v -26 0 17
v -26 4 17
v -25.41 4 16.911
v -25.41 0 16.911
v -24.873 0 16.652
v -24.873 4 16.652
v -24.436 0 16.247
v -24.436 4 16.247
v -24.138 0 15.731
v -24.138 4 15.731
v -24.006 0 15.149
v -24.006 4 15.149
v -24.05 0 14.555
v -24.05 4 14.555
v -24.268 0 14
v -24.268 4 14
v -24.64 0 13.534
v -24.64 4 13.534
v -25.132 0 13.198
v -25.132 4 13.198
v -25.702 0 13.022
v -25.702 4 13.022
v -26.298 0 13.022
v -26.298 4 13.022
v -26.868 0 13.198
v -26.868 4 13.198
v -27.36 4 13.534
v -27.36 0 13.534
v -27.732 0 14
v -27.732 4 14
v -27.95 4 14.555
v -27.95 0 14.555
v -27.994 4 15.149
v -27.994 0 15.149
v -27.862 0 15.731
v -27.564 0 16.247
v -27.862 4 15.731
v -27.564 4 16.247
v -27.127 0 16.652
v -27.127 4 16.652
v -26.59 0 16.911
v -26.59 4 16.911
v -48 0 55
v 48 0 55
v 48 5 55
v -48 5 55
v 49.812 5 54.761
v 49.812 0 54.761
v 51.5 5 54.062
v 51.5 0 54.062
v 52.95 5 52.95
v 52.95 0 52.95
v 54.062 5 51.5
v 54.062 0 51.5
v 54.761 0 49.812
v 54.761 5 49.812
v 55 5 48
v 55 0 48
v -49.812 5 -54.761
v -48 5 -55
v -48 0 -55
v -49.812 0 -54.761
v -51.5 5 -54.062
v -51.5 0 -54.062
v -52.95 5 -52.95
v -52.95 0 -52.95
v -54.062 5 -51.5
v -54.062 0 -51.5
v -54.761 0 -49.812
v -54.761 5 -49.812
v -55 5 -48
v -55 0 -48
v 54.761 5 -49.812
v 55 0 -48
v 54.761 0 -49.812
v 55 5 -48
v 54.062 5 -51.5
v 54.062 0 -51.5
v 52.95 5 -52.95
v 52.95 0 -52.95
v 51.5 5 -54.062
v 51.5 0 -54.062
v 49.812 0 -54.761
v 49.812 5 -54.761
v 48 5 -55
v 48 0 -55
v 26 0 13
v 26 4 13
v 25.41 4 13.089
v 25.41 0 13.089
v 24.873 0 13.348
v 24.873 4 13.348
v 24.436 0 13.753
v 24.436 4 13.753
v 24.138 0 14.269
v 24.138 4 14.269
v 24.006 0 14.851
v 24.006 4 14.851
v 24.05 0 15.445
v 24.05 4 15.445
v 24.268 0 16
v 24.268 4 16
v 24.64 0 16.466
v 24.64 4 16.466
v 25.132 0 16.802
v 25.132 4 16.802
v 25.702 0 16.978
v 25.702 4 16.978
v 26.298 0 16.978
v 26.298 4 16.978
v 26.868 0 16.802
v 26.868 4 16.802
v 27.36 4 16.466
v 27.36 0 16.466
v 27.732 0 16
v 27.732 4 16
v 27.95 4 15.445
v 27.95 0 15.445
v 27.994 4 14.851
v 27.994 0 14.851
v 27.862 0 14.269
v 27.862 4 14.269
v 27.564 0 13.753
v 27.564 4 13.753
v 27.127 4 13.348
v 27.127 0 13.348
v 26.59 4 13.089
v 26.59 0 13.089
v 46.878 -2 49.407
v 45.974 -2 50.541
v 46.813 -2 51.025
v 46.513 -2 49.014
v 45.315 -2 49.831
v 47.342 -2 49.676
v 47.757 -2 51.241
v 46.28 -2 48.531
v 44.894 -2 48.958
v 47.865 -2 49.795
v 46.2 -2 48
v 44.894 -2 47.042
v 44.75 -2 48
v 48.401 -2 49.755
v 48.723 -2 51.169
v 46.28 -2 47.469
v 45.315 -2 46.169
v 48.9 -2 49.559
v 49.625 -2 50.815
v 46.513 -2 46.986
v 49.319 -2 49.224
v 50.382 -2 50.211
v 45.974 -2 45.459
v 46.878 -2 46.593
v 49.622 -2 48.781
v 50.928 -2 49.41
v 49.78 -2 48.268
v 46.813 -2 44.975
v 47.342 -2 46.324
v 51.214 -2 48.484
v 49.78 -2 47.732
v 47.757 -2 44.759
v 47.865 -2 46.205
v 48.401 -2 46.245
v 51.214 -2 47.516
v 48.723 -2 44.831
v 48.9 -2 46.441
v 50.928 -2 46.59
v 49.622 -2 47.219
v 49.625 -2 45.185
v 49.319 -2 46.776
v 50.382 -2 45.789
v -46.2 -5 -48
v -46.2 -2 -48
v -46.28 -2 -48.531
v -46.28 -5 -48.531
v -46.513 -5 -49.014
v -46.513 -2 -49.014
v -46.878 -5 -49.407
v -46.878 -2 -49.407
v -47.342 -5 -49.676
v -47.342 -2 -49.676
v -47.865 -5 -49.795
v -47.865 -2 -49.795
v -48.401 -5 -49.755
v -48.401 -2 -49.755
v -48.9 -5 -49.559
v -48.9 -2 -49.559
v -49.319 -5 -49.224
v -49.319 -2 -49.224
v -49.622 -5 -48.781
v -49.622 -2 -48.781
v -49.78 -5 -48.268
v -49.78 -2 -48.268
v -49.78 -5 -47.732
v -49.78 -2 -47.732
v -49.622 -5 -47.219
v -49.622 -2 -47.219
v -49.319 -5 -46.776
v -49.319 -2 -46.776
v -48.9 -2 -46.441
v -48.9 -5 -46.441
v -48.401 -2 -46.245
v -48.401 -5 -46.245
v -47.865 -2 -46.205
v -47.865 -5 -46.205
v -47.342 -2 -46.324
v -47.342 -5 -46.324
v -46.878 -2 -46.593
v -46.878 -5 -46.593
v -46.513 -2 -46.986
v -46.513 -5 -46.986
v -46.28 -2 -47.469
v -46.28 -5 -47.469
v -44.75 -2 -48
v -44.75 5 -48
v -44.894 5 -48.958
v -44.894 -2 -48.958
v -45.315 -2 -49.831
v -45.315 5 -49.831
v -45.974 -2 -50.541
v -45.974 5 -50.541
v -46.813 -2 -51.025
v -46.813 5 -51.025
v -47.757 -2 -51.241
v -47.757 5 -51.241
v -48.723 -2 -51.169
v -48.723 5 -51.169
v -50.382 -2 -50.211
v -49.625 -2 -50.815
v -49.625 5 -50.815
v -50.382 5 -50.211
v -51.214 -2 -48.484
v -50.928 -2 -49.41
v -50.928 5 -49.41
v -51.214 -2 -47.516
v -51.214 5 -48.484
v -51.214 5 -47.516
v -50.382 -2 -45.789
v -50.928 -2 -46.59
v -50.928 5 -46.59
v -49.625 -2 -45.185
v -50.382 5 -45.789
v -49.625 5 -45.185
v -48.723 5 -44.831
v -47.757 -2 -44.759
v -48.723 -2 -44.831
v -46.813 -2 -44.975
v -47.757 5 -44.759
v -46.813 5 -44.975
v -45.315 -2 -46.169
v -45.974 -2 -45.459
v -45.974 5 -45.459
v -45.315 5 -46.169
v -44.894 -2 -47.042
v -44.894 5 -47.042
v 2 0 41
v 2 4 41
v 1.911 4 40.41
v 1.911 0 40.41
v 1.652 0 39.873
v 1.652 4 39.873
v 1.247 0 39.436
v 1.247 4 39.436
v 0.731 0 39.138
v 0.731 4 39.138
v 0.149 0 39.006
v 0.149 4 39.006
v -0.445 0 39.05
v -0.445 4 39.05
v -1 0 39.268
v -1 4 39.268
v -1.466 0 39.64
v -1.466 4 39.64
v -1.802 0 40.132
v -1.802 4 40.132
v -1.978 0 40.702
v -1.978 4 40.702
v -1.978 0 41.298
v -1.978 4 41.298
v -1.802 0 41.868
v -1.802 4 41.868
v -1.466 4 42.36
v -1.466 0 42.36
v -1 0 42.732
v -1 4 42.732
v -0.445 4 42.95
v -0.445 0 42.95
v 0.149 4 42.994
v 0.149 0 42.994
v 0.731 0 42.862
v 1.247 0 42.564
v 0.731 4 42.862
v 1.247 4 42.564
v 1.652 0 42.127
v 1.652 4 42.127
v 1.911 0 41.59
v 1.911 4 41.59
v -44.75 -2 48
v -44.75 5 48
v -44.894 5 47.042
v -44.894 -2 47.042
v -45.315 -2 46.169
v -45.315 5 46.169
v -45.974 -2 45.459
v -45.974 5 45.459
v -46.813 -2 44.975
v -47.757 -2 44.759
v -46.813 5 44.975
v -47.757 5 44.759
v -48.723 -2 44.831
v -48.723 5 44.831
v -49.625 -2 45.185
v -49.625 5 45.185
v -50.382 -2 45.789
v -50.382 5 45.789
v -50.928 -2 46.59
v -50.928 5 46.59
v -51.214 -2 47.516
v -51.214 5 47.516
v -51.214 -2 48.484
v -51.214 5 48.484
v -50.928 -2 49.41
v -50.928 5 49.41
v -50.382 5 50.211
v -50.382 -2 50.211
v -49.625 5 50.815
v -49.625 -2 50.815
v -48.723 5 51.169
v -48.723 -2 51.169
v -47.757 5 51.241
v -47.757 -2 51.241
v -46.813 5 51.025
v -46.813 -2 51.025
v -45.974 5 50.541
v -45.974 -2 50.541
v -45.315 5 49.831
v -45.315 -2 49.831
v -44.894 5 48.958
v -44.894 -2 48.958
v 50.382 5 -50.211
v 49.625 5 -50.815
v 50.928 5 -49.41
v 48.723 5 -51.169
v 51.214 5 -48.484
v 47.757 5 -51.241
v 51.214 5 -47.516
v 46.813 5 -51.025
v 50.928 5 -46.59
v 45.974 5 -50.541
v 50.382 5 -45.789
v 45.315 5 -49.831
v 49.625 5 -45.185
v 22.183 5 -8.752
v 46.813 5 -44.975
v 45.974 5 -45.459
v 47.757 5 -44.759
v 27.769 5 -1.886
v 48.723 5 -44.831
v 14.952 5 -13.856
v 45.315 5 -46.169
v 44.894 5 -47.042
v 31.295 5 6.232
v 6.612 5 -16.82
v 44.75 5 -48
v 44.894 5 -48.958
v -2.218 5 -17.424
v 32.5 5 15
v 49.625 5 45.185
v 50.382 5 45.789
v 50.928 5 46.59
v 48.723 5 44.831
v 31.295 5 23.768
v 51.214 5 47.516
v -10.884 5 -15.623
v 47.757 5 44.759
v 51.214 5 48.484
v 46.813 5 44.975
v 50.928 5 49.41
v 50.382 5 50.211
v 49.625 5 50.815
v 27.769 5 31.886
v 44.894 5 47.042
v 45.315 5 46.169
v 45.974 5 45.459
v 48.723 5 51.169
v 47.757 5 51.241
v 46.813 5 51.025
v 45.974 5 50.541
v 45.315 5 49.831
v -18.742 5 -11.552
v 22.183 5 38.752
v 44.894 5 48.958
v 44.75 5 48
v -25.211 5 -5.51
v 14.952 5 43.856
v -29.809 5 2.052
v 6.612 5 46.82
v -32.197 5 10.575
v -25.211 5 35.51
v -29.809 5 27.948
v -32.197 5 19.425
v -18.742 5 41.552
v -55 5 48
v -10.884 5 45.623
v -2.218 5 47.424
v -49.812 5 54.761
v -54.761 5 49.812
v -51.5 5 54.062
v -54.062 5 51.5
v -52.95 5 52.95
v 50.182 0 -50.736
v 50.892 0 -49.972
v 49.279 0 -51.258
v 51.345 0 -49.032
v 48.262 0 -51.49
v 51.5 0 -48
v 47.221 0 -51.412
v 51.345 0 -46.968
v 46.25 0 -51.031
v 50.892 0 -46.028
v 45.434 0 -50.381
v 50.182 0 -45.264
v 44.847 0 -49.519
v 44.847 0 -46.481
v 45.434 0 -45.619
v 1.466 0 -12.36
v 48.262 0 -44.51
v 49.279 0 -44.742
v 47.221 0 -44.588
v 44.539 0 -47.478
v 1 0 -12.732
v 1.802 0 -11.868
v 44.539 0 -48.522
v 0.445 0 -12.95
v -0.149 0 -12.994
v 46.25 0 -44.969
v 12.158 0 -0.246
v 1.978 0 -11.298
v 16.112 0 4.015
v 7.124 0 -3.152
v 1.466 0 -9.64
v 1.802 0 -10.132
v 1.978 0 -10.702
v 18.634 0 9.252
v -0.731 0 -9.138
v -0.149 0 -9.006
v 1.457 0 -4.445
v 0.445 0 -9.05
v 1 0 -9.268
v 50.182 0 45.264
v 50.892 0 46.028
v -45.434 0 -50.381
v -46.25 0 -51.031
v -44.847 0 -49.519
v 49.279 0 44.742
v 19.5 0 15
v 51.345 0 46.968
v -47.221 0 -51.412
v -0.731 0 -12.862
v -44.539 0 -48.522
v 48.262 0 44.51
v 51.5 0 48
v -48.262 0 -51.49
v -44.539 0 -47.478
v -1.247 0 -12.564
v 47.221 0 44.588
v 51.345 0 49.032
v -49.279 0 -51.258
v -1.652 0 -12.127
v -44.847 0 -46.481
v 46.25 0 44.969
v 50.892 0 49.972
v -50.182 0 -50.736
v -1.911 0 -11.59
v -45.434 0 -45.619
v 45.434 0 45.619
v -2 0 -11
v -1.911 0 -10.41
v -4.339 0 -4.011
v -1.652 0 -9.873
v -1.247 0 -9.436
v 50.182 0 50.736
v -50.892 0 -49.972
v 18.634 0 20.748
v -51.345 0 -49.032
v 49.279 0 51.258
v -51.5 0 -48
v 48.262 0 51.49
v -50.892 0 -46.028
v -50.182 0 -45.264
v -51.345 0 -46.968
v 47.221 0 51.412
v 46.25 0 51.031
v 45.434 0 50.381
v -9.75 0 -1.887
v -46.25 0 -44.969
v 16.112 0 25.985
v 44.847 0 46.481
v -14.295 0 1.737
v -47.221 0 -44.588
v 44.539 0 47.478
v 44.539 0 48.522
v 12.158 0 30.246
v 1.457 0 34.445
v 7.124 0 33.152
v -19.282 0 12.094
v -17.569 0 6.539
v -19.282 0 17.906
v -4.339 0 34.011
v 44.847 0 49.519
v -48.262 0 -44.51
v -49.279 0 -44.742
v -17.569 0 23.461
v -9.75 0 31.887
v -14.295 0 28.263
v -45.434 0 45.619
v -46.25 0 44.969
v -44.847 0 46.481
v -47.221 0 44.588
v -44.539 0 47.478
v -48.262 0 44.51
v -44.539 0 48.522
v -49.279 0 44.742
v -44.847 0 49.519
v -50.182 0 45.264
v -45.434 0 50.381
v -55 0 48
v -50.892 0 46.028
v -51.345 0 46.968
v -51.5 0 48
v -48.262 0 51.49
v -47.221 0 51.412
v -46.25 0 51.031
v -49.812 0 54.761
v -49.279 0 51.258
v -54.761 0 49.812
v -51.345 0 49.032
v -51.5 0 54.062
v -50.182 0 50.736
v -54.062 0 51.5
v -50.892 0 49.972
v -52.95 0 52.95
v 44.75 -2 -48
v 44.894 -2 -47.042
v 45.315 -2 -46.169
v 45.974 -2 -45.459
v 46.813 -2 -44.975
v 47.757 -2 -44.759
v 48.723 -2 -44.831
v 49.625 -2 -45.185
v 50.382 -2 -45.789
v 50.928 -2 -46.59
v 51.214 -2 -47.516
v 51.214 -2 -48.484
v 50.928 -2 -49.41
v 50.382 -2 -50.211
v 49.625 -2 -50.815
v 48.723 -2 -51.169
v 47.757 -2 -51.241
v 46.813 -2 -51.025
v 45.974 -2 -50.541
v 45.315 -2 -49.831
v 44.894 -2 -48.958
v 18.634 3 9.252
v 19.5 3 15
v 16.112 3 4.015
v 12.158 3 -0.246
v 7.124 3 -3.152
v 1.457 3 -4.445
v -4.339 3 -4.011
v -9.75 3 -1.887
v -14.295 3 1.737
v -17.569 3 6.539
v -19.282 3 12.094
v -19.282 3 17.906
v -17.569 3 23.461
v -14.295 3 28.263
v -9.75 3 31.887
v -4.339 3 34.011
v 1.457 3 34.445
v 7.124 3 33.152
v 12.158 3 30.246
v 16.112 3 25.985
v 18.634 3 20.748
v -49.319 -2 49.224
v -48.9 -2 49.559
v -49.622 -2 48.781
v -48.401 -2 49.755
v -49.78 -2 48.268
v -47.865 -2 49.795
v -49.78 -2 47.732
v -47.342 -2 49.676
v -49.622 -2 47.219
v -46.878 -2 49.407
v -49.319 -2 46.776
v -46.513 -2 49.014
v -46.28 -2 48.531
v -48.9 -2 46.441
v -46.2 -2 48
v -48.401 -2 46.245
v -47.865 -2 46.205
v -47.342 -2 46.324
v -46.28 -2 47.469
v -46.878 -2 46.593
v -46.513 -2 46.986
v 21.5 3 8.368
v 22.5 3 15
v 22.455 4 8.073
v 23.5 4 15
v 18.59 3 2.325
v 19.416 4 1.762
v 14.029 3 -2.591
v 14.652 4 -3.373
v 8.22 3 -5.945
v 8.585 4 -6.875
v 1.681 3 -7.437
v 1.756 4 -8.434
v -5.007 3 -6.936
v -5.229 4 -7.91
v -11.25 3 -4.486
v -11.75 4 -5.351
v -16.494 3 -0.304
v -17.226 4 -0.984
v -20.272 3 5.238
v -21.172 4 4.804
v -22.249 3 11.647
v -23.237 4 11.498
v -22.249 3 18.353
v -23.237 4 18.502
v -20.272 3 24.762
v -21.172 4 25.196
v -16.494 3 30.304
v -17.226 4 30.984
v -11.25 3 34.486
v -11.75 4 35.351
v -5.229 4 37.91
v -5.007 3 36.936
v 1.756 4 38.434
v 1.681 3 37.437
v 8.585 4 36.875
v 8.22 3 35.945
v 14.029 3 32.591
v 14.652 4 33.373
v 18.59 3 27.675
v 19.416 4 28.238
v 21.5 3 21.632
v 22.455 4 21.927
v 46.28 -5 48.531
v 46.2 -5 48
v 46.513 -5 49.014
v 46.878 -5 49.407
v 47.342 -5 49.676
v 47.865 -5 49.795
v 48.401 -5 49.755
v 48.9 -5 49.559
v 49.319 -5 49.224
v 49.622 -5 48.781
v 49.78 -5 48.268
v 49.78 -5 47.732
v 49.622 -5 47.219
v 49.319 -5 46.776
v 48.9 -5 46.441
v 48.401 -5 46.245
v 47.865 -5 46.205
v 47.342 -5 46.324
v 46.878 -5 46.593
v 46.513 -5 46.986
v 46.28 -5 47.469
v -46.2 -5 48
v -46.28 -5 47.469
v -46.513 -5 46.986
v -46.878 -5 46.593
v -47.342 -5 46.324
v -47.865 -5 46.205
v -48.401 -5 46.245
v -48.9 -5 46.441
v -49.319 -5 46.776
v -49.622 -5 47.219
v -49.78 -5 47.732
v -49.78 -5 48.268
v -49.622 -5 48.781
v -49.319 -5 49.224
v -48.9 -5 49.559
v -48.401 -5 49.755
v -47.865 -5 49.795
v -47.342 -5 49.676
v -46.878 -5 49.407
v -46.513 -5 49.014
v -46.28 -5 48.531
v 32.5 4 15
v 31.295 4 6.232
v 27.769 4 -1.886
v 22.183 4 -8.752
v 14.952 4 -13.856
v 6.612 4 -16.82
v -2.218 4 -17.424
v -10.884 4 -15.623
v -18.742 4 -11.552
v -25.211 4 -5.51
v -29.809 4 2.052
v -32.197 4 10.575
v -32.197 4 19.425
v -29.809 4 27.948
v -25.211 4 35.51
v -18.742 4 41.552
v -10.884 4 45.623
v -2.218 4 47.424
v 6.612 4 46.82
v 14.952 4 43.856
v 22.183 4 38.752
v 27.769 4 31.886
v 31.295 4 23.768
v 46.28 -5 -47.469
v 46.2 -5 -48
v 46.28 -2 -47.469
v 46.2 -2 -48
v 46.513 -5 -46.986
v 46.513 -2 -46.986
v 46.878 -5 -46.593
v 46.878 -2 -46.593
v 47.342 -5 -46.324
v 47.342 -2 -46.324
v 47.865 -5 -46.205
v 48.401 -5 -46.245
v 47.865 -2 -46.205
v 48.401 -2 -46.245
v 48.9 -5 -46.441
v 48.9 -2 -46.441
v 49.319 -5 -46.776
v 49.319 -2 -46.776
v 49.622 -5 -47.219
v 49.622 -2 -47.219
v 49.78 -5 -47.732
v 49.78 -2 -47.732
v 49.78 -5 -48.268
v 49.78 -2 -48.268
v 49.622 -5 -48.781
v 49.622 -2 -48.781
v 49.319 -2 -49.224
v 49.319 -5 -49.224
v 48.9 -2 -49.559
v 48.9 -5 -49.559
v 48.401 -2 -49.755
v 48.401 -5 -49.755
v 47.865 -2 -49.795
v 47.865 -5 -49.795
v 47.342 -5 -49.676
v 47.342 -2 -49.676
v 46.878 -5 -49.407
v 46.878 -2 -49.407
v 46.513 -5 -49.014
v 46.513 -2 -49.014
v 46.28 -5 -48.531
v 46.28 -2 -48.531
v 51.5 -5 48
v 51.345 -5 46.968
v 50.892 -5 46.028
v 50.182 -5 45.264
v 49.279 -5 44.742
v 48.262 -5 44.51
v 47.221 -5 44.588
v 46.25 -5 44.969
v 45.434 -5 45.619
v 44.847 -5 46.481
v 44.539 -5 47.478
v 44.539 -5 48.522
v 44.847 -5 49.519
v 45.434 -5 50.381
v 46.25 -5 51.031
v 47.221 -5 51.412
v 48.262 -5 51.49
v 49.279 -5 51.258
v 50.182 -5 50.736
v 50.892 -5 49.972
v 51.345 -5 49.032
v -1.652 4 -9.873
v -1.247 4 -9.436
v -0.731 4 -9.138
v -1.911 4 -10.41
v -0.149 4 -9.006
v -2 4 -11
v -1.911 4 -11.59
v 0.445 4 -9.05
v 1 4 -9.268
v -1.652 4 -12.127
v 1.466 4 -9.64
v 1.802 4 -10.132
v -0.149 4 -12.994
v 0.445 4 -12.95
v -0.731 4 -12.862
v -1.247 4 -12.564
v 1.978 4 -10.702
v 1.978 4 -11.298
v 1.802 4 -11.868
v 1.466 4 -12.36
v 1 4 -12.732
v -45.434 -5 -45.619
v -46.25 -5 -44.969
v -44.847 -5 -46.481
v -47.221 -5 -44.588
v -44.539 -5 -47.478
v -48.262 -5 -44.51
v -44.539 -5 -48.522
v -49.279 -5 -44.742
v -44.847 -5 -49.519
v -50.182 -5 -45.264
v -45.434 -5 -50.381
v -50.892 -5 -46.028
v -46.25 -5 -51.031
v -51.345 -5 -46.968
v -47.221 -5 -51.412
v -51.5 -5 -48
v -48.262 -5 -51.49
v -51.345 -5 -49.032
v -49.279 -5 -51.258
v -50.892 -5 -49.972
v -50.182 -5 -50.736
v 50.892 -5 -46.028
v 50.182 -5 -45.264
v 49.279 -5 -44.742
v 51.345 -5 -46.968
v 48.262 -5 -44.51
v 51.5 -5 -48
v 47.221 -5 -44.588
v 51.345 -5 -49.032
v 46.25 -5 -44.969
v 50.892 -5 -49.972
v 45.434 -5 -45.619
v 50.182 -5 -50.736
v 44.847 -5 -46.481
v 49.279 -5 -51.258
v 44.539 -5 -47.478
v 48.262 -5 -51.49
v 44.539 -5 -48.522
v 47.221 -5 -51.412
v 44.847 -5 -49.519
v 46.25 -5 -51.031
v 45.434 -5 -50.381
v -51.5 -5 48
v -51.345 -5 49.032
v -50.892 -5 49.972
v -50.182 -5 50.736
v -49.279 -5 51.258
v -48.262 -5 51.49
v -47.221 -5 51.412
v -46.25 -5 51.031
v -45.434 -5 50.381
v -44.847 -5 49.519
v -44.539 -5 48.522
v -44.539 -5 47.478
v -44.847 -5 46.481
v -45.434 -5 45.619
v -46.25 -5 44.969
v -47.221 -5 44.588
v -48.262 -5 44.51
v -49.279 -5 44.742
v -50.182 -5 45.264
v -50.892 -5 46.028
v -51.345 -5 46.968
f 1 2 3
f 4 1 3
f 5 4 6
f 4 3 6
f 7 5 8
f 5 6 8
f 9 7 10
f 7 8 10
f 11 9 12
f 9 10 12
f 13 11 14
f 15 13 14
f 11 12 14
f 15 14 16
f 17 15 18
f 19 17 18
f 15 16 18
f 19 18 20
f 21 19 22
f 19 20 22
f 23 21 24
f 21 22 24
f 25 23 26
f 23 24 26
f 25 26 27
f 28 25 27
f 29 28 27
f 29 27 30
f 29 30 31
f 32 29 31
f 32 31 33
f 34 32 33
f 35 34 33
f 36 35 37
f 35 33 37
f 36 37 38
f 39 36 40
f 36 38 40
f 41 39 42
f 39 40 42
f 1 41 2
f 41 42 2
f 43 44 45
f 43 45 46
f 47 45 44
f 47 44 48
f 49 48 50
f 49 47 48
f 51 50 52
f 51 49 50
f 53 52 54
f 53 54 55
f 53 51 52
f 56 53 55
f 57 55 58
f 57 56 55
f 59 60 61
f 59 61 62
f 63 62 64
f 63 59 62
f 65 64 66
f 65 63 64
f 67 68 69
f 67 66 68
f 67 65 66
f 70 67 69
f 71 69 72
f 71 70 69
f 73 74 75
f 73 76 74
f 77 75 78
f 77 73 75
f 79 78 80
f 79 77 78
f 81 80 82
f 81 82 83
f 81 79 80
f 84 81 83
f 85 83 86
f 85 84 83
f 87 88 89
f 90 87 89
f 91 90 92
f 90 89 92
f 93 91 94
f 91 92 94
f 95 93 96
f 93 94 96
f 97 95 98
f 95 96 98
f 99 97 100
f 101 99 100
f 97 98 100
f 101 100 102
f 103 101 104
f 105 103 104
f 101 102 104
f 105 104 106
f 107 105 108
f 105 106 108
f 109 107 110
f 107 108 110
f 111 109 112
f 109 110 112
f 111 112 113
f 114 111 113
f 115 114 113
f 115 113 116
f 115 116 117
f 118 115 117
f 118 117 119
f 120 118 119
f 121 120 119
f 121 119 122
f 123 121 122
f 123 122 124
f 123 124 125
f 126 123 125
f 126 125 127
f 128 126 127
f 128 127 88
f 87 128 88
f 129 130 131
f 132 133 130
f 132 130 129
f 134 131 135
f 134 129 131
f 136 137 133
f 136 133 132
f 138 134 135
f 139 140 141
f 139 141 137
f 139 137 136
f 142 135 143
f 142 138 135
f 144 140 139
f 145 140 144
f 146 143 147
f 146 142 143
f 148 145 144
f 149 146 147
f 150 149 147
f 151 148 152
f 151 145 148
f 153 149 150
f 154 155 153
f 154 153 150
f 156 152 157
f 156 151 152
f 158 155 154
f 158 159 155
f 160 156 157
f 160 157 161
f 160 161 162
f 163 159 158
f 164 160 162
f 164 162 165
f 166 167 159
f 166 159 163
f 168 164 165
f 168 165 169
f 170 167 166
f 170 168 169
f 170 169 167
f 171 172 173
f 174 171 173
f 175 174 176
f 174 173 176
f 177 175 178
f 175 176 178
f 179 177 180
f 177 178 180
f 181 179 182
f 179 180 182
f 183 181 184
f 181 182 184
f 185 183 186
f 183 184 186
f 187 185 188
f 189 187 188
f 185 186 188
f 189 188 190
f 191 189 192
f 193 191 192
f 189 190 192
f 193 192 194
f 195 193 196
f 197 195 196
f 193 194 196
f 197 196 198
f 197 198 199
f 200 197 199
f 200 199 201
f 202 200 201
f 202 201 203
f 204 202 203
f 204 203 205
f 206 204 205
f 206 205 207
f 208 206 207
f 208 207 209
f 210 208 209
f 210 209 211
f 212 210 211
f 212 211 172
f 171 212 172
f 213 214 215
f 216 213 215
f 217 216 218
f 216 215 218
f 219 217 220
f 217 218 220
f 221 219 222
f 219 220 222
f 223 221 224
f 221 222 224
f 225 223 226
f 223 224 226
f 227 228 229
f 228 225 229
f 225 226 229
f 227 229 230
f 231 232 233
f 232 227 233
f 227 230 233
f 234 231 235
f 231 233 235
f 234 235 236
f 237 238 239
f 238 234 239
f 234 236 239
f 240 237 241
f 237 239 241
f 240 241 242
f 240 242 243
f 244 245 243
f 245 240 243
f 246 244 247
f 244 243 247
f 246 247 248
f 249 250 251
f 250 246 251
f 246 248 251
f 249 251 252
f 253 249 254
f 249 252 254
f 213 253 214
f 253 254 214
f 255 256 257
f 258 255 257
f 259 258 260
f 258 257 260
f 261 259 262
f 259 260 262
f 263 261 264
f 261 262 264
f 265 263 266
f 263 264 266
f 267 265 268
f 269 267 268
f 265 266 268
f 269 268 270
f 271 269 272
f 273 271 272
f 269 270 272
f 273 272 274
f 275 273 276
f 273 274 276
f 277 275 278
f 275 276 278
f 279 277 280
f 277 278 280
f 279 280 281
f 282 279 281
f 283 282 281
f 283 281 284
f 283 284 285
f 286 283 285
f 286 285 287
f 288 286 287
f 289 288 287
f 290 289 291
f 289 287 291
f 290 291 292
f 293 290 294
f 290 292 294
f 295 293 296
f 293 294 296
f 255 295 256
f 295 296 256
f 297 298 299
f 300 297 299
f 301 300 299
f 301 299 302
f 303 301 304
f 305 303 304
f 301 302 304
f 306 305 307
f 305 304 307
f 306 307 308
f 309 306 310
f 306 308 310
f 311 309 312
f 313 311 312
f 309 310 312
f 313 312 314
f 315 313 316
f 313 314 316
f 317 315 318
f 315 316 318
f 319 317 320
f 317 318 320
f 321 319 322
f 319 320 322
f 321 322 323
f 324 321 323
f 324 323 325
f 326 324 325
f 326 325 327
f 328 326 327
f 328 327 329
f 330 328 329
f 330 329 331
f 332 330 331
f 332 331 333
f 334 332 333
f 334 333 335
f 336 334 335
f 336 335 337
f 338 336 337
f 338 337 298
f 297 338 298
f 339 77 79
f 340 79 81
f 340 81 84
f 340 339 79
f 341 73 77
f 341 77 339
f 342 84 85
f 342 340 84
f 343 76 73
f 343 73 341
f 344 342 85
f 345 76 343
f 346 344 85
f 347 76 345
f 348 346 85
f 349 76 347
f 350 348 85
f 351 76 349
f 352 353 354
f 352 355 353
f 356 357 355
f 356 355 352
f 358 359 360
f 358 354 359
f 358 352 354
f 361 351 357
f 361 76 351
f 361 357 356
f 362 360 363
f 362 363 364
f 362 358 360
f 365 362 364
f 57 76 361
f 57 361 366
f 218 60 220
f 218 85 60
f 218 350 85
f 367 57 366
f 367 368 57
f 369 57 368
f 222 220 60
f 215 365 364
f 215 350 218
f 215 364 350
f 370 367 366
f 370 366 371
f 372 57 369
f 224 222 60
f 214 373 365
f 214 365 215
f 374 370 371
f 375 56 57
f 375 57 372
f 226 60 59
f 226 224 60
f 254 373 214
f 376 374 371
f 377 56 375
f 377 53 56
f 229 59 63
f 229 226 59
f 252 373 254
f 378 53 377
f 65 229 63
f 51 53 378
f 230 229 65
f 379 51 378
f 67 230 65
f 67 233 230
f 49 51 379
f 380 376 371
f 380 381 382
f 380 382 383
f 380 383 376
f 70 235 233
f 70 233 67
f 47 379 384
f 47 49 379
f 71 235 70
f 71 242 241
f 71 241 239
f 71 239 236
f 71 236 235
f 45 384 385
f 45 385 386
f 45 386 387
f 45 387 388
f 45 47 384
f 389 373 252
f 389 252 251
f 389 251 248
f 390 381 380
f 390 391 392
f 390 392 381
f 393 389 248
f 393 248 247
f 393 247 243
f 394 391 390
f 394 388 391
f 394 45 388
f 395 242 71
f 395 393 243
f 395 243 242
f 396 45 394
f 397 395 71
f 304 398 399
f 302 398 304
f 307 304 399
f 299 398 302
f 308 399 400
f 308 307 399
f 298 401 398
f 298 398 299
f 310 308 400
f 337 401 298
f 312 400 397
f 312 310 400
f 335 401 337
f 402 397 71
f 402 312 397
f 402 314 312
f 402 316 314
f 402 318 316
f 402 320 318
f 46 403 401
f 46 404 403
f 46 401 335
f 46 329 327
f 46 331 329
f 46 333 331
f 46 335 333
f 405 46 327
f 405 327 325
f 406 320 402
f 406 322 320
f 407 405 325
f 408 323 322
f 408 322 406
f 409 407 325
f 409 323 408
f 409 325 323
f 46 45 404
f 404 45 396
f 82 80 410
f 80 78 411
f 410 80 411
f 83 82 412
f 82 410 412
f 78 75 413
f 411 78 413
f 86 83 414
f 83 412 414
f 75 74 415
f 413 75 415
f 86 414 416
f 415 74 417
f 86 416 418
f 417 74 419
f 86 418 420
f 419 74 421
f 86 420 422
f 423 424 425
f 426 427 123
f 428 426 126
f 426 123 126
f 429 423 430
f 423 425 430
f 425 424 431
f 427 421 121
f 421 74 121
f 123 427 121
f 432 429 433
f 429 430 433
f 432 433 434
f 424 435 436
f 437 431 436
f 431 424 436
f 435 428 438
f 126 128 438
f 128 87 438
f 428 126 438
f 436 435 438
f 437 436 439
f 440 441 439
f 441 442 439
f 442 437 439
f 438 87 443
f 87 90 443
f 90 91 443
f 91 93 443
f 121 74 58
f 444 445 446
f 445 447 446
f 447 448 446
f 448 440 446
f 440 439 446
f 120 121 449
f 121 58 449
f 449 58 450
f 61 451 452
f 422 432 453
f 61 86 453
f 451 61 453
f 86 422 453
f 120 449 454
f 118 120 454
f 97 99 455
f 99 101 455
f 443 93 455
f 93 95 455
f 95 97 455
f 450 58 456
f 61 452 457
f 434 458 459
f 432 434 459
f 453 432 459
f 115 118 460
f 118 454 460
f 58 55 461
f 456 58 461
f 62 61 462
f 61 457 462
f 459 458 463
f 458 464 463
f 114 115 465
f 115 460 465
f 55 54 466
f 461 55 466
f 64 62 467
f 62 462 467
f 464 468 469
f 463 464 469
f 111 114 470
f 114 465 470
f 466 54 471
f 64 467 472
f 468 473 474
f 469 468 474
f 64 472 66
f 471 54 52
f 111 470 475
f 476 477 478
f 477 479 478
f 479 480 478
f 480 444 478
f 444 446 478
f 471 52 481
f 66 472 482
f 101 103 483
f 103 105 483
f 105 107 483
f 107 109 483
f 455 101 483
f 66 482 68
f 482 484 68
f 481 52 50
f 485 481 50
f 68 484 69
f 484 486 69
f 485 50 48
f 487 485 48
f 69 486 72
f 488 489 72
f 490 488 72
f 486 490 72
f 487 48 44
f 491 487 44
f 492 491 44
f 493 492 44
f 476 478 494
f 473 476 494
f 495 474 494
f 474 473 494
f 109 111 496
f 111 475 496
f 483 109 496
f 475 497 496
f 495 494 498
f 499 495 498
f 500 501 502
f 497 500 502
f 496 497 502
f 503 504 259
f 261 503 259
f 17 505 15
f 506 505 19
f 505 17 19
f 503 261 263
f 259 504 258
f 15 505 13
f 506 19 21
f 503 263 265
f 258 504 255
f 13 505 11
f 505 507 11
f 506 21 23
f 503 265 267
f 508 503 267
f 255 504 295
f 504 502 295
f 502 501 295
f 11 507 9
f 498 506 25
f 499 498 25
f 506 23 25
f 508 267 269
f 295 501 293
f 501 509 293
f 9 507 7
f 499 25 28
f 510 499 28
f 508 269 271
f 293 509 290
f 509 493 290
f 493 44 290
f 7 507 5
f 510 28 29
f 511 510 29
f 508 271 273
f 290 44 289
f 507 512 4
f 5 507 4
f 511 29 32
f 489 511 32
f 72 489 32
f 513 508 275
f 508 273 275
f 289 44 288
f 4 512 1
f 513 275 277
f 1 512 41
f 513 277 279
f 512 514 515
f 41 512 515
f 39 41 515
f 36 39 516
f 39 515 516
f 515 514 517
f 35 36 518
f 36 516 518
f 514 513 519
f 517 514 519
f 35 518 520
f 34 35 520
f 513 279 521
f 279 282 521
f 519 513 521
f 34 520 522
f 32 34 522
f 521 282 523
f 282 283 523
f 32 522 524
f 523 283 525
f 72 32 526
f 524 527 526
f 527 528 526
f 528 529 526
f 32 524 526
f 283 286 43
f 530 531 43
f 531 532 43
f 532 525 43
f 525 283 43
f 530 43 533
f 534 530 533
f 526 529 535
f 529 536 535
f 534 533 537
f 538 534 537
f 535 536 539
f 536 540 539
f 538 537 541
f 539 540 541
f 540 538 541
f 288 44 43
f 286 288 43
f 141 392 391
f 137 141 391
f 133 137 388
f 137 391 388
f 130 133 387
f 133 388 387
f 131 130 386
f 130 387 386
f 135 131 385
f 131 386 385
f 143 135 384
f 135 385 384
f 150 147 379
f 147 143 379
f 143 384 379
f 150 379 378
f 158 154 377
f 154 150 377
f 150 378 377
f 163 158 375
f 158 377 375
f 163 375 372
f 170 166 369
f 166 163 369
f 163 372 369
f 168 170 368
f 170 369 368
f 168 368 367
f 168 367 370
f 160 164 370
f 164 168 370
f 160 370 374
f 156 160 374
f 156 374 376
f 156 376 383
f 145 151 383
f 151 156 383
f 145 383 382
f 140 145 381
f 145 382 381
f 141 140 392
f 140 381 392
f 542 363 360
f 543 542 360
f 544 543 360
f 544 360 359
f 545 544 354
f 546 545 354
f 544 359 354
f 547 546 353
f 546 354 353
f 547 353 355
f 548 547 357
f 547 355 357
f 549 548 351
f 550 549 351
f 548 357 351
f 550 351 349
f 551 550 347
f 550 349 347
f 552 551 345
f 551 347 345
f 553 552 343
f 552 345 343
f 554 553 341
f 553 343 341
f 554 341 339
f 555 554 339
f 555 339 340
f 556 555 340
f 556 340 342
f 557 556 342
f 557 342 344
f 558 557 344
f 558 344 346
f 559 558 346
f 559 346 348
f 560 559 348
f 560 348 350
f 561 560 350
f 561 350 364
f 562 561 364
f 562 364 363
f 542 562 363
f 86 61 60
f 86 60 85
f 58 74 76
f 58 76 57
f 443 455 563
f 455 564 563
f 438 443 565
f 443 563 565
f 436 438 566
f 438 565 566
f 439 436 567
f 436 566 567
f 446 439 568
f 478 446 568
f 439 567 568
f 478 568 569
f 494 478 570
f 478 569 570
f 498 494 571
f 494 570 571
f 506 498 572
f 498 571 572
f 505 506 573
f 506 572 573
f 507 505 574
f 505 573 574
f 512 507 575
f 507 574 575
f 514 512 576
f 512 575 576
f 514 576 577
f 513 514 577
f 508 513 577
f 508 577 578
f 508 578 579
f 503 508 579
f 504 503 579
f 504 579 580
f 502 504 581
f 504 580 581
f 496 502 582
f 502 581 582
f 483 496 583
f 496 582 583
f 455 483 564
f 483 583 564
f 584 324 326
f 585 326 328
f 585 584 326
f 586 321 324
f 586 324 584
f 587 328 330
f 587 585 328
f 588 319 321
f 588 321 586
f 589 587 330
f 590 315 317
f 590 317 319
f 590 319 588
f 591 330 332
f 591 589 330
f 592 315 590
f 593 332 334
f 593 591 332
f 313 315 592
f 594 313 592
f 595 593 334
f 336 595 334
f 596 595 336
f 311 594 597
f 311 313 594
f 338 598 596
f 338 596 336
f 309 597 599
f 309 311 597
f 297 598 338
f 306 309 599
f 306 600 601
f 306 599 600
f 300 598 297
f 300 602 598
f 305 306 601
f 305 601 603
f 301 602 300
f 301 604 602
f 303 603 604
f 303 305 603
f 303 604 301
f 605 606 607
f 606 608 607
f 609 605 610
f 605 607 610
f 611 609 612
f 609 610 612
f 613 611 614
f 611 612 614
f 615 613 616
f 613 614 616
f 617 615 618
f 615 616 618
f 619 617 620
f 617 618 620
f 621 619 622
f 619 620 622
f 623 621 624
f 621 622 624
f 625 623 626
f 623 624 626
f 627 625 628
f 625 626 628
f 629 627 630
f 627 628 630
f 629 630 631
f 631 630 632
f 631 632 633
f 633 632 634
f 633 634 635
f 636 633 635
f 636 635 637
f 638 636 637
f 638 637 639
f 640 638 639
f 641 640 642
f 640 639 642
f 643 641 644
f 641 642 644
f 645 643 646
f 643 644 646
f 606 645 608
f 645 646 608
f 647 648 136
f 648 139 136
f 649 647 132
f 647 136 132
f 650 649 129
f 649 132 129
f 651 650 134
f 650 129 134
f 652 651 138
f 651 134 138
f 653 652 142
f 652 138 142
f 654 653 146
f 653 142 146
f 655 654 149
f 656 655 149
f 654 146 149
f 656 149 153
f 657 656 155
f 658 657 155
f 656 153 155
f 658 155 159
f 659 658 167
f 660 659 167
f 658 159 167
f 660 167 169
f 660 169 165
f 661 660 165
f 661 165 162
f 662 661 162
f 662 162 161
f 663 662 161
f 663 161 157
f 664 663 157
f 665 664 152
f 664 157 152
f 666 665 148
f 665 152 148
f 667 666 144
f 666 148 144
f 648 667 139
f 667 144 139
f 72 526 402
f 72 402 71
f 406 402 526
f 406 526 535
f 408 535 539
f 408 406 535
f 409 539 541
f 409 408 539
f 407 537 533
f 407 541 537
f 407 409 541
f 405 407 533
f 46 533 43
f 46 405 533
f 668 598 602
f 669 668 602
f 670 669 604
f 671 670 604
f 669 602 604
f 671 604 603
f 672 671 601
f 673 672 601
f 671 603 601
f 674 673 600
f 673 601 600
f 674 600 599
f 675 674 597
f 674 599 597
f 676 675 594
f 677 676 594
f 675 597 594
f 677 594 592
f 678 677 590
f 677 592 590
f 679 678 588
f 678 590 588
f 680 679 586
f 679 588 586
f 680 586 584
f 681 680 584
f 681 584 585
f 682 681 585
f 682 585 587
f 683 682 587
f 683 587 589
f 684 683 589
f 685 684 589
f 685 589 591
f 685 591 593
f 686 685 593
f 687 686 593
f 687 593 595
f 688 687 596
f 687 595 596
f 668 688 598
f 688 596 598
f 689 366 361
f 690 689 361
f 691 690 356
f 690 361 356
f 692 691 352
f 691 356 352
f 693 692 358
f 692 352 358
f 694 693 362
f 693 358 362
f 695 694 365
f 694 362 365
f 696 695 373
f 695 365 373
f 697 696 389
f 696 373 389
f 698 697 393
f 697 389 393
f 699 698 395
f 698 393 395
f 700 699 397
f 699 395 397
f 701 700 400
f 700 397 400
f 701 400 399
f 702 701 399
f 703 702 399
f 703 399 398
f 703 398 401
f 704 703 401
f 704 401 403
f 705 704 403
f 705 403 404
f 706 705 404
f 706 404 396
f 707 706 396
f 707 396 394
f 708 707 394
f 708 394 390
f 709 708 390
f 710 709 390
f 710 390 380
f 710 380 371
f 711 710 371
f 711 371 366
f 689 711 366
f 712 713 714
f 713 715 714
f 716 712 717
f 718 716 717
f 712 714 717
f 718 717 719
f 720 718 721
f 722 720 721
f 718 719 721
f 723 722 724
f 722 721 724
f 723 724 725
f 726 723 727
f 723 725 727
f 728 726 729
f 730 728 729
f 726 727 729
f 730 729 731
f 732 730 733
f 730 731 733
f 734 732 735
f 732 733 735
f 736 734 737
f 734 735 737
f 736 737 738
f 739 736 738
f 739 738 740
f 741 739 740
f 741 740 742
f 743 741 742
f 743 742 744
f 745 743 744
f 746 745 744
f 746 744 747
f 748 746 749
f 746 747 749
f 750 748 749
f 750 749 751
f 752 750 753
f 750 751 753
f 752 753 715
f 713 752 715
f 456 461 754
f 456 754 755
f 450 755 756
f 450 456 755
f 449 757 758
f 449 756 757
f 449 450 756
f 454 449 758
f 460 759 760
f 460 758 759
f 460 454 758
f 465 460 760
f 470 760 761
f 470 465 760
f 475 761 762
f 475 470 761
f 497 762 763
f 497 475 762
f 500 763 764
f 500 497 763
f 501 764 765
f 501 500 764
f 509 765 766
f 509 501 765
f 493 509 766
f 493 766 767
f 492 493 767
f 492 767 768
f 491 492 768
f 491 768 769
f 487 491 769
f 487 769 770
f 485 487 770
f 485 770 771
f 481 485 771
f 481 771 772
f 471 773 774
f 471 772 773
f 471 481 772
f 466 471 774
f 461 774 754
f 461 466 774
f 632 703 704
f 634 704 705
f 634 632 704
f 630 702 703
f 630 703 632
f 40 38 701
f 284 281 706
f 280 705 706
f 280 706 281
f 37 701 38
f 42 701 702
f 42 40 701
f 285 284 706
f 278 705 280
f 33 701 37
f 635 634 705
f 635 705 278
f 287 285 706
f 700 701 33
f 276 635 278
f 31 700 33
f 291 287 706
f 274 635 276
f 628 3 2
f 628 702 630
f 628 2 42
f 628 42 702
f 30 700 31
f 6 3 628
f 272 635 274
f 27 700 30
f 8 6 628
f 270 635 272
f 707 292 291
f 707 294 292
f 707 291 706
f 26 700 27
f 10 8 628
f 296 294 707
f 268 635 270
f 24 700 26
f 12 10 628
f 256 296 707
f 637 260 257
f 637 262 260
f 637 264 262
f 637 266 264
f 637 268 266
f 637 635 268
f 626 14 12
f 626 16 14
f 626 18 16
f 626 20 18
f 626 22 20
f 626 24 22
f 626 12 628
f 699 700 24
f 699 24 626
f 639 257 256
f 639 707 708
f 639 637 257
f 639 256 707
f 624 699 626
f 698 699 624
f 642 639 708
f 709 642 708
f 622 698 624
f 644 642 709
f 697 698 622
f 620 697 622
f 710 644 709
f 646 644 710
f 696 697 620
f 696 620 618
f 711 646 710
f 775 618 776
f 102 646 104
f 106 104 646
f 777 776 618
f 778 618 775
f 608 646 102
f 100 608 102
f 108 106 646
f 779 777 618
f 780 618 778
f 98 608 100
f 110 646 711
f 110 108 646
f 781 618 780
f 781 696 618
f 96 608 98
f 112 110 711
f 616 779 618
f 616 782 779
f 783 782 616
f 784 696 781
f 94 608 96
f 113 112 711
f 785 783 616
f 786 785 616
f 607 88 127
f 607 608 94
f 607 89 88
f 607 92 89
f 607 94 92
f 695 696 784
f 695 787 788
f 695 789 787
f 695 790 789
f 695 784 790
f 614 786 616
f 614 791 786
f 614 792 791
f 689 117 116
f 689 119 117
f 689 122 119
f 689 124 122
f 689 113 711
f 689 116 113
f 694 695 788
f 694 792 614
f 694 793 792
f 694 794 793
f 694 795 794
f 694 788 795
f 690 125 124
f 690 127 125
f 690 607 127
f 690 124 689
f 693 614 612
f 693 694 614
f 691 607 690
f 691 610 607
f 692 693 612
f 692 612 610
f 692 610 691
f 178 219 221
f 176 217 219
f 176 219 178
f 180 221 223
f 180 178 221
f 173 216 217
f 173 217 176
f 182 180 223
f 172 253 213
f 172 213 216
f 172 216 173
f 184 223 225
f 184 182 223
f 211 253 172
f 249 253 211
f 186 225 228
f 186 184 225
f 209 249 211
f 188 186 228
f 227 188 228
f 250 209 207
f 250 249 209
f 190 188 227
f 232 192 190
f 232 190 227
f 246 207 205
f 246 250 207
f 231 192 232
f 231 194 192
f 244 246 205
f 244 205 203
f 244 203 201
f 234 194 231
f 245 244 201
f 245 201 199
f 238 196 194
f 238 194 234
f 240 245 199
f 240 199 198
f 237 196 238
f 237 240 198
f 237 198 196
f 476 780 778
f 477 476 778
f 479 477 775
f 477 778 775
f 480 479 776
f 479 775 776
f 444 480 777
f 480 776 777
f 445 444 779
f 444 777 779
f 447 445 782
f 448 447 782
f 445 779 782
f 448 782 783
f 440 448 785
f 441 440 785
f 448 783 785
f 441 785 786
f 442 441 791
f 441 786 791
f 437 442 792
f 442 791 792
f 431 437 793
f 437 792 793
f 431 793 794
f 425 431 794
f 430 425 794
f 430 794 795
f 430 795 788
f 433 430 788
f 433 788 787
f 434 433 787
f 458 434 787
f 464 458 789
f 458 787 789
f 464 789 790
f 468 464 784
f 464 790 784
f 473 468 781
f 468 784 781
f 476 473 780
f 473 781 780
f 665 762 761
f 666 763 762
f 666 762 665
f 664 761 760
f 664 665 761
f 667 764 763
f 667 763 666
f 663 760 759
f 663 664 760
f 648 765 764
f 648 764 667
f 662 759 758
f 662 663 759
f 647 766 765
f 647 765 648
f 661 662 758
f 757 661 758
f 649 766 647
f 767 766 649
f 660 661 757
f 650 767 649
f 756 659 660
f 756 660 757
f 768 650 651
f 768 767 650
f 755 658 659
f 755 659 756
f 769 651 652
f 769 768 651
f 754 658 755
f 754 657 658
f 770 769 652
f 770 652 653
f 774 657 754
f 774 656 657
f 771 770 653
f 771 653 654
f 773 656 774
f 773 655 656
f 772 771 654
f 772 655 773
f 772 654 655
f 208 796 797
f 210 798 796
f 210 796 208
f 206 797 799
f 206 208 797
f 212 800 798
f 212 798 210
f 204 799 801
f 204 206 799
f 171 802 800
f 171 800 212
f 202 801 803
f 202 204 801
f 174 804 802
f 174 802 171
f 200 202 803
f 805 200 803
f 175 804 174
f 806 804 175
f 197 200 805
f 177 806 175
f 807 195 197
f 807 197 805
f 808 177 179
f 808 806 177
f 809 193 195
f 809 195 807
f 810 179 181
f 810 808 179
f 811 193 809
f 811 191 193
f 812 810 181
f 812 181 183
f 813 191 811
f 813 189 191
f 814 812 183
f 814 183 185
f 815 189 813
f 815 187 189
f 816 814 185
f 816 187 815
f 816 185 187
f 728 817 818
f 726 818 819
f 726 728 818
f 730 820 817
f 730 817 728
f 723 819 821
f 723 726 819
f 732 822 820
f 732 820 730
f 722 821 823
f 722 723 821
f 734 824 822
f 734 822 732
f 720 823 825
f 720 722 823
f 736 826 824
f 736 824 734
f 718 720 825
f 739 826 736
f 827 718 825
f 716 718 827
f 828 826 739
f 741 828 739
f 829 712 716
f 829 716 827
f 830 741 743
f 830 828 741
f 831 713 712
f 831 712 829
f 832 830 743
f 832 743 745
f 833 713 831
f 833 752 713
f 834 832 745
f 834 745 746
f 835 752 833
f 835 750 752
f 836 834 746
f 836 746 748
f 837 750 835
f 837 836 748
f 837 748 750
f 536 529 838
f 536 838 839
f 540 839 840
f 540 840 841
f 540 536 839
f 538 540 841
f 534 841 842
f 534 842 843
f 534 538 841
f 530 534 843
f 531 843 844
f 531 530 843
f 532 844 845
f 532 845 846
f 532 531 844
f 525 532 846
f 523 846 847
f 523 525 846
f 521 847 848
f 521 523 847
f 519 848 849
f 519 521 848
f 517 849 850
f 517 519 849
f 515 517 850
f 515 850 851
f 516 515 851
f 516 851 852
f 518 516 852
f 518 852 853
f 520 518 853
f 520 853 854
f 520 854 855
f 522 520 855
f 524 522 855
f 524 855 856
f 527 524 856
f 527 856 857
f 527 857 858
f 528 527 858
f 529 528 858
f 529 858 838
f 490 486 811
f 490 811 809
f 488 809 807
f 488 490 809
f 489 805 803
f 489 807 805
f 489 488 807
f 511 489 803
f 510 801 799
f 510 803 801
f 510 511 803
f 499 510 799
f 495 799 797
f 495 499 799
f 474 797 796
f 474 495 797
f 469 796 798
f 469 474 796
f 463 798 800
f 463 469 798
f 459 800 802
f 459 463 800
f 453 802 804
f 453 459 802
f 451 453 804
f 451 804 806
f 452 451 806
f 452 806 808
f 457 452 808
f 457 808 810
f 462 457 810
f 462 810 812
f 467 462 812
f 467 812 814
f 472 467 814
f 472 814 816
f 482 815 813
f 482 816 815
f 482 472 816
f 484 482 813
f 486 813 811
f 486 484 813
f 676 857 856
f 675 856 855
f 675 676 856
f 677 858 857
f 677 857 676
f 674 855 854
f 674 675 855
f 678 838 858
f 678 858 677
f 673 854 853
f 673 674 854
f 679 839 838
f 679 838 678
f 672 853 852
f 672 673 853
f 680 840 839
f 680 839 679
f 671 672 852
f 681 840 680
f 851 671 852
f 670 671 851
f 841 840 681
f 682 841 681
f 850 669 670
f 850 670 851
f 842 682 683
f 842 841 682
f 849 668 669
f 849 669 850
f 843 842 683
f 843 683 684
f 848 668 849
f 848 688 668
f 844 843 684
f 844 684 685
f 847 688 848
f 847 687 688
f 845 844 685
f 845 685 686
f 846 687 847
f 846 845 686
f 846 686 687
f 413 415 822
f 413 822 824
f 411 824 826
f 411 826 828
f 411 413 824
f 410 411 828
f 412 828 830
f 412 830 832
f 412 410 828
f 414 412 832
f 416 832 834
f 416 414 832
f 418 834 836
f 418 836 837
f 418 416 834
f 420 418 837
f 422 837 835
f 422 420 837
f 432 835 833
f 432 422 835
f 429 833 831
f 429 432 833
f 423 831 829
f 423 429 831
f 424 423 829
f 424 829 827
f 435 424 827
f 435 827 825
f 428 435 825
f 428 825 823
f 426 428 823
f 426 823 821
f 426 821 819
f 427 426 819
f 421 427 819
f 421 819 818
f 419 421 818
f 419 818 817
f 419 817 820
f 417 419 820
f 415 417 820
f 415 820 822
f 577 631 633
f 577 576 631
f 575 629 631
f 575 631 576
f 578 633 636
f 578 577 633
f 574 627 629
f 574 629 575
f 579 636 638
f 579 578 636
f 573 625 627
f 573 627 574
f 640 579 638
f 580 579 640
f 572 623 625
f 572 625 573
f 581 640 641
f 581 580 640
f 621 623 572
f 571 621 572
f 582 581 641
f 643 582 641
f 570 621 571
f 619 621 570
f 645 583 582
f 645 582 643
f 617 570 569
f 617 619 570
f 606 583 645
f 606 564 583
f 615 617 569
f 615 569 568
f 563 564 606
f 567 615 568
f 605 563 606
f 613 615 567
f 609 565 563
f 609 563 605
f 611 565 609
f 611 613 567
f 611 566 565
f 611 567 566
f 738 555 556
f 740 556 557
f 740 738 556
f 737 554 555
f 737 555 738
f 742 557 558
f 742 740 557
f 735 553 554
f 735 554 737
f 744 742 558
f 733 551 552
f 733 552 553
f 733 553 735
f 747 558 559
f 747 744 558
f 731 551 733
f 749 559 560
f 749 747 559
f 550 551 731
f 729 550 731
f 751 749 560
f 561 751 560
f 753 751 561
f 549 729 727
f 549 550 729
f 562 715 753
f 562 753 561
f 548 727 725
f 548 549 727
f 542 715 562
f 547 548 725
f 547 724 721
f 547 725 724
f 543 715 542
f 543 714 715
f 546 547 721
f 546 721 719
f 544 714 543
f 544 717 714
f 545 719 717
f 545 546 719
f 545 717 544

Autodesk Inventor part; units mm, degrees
ref_plane "YZ Plane" through (0, 0, 0) normal (1, 0, 0) x (0, 1, 0)
ref_plane "XZ Plane" through (0, 0, 0) normal (0, 1, 0) x (-1, 0, 0)
ref_plane "XY Plane" through (0, 0, 0) normal (0, 0, 1) x (1, 0, 0)
sketch "스케치1" plane through (0, 0, 0) normal (0, 1, 0) x (-1, 0, 0)
  line L0 (-55, 55) -> (55, 55)
  line L1 (55, 55) -> (55, -55)
  line L2 (55, -55) -> (-55, -55)
  line L3 (-55, -55) -> (-55, 55)
  line L4 (-55, 55) -> (55, -55) construction
  line L5 (55, 55) -> (-55, -55) construction
  point P0 (0, 0)
  dimension "d0" = 110
  dimension "d1" = 110
extrude "돌출1" add sketch "스케치1" along normal blind 5
fillet "모깎기1" radius 7 1 edges at (55, 2.5, 55)
fillet "모깎기2" radius 7 3 edges at (55, 2.5, -55) (-55, 2.5, -55) (-55, 2.5, 55)
sketch "스케치5" plane through (0, 0, 0) normal (0, -1, 0) x (1, 0, 0)
  arc A0 (55, 48) -> (48, 55) centre (48, 48) ccw projected
  circle A1 centre (48, 48) radius 3.5
  point P0 (0, 0)
  dimension "d15" = 7
extrude "돌출5" add sketch "스케치5" along normal blind 5
mirror "미러1" about plane through (0, 0, 0) normal (1, 0, 0) of "돌출5"
mirror "미러2" about plane through (0, 0, 0) normal (0, 0, 1) of "돌출5", "미러1"
sketch "스케치6" plane through (0, 5, 0) normal (0, 1, 0) x (1, 0, 0)
  arc A0 (-55, -48) -> (-48, -55) centre (-48, -48) ccw projected
  arc A1 (-48, 55) -> (-55, 48) centre (-48, 48) ccw projected
  arc A2 (55, 48) -> (48, 55) centre (48, 48) ccw projected
  arc A3 (48, -55) -> (55, -48) centre (48, -48) ccw projected
  circle A4 centre (-48, -48) radius 3.25
  point P0 (0, 0)
  dimension "d18" = 6.5
extrude "돌출6" cut sketch "스케치6" against normal blind 7
mirror "미러3" about plane through (0, 0, 0) normal (1, 0, 0) of "돌출6"
mirror "미러4" about plane through (0, 0, 0) normal (0, 0, 1) of "돌출6", "미러3"
sketch "스케치7" plane through (-48, -2, 48) normal (0, 1, 0) x (1, 0, 0)
  arc A0 (-7, 0) -> (0, -7) centre (0, 0) ccw projected
  circle A1 centre (0, 0) radius 1.8
  point P0 (48, 48)
  dimension "d21" = 3.6
extrude "돌출7" cut sketch "스케치7" against normal through all
mirror "미러5" about plane through (0, 0, 0) normal (0, 0, 1) of "돌출7"
mirror "미러6" about plane through (0, 0, 0) normal (1, 0, 0) of "돌출7", "미러5"
sketch "스케치9" plane through (0, 5, 0) normal (0, 1, 0) x (1, 0, 0)
  circle A0 centre (0, -15) radius 32.5
  line L0 (42.9638, 0) -> (-42.9638, 0) construction
  point P0 (0, 0)
  dimension "d32" = 65
  dimension "d33" = 15
extrude "돌출9" cut sketch "스케치9" against normal blind 1
sketch "스케치10" plane through (0, 4, 15) normal (0, 1, 0) x (1, 0, 0)
  circle A0 centre (0, 0) radius 22.5
  point P0 (0, 15)
  dimension "d36" = 45
extrude "돌출10" cut sketch "스케치10" against normal blind 1
sketch "스케치11" plane through (0, 3, 15) normal (0, 1, 0) x (1, 0, 0)
  circle A0 centre (0, 0) radius 19.5
  point P0 (0, 15)
  dimension "d39" = 39
extrude "돌출11" cut sketch "스케치11" against normal through all
chamfer "모따기2" distance 1 angle 45 1 edges at (-22.5, 4, 15)
sketch "스케치12" plane through (0, 4, 15) normal (0, 1, 0) x (1, 0, 0)
  circle A0 centre (0, 0) radius 26 construction
  circle A1 centre (0, -26) radius 2
  point P0 (0, 15)
  dimension "d48" = 52
  dimension "d49" = 4
extrude "돌출12" cut sketch "스케치12" against normal blind 10
pattern_circular "원형 패턴1" count 4 over 360 about axis through (0, 3.5, 15) along (0, 1, 0) of "돌출12"
properties part number "연결부"
